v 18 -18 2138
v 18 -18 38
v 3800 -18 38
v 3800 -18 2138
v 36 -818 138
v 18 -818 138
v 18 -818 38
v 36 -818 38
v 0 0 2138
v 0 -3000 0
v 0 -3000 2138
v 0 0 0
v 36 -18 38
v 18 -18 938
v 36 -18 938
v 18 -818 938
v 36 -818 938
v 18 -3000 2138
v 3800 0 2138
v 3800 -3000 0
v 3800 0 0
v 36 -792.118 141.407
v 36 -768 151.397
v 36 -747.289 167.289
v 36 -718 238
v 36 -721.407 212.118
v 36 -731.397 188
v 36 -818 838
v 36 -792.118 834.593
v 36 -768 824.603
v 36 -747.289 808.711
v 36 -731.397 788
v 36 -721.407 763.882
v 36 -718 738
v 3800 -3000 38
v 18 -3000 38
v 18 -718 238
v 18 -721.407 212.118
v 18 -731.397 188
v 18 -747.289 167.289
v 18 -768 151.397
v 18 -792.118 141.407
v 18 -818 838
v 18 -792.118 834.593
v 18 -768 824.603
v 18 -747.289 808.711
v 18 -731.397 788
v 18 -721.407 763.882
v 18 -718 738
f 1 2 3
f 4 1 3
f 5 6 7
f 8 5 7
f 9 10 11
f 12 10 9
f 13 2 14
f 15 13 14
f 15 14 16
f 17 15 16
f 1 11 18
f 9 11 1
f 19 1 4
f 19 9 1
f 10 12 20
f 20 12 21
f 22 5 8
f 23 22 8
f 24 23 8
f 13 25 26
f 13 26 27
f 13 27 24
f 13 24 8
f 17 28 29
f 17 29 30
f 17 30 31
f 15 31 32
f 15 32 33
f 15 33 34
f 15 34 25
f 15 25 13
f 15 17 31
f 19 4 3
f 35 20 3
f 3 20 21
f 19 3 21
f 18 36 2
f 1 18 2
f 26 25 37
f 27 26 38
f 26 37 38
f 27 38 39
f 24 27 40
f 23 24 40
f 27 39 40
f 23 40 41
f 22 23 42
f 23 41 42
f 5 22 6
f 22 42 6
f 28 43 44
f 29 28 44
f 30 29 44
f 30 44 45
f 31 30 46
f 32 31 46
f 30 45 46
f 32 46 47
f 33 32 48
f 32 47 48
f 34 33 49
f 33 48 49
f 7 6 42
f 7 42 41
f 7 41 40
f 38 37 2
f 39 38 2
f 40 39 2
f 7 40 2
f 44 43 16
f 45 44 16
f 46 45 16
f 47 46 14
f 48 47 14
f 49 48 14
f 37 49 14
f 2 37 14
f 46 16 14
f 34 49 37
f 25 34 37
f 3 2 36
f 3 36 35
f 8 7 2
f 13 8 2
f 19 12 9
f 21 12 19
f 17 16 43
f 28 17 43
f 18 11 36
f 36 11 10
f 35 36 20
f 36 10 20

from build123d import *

# Parameters (mm, degrees)
F0_W     = 3800
F0_H     = 3000
F1_DEPTH = 38
F2_W     = 3800
F2_H     = 18
F3_DEPTH = 2100
F4_W     = 18
F4_H     = 2982
F5_DEPTH = 2100
F7_DEPTH = 18


with BuildPart() as f1:
    # F0 (on Top) → F1 (new body)
    with BuildSketch(Plane.XY):
        with Locations((1900, -1500)):
            Rectangle(F0_W, F0_H)
    extrude(amount=F1_DEPTH)

    # F2 (on face) → F3 (join)
    with BuildSketch(Plane.XY.offset(38)):
        with Locations((1900, -9)):
            Rectangle(F2_W, F2_H)
    extrude(amount=F3_DEPTH)

    # F4 (on face) → F5 (join)
    with BuildSketch(Plane.XY.offset(38)):
        with Locations((9, -1509)):
            Rectangle(F4_W, F4_H)
    extrude(amount=F5_DEPTH)


with BuildPart() as f7:
    # F6 (on face) → F7 (new body)
    with BuildSketch(Plane.YZ.offset(18)):
        with BuildLine():
            Line((-818, 138), (-818, 38))
            Line((-818, 38), (-18, 38))
            Line((-18, 38), (-18, 938))
            Line((-18, 938), (-818, 938))
            Line((-818, 938), (-818, 838))
            ThreePointArc((-818, 838), (-747.289322, 808.710678), (-718, 738))
            Line((-718, 738), (-718, 238))
            ThreePointArc((-718, 238), (-747.289322, 167.289322), (-818, 138))
        make_face()
    extrude(amount=F7_DEPTH)


solid = Compound([f1.part, f7.part])
